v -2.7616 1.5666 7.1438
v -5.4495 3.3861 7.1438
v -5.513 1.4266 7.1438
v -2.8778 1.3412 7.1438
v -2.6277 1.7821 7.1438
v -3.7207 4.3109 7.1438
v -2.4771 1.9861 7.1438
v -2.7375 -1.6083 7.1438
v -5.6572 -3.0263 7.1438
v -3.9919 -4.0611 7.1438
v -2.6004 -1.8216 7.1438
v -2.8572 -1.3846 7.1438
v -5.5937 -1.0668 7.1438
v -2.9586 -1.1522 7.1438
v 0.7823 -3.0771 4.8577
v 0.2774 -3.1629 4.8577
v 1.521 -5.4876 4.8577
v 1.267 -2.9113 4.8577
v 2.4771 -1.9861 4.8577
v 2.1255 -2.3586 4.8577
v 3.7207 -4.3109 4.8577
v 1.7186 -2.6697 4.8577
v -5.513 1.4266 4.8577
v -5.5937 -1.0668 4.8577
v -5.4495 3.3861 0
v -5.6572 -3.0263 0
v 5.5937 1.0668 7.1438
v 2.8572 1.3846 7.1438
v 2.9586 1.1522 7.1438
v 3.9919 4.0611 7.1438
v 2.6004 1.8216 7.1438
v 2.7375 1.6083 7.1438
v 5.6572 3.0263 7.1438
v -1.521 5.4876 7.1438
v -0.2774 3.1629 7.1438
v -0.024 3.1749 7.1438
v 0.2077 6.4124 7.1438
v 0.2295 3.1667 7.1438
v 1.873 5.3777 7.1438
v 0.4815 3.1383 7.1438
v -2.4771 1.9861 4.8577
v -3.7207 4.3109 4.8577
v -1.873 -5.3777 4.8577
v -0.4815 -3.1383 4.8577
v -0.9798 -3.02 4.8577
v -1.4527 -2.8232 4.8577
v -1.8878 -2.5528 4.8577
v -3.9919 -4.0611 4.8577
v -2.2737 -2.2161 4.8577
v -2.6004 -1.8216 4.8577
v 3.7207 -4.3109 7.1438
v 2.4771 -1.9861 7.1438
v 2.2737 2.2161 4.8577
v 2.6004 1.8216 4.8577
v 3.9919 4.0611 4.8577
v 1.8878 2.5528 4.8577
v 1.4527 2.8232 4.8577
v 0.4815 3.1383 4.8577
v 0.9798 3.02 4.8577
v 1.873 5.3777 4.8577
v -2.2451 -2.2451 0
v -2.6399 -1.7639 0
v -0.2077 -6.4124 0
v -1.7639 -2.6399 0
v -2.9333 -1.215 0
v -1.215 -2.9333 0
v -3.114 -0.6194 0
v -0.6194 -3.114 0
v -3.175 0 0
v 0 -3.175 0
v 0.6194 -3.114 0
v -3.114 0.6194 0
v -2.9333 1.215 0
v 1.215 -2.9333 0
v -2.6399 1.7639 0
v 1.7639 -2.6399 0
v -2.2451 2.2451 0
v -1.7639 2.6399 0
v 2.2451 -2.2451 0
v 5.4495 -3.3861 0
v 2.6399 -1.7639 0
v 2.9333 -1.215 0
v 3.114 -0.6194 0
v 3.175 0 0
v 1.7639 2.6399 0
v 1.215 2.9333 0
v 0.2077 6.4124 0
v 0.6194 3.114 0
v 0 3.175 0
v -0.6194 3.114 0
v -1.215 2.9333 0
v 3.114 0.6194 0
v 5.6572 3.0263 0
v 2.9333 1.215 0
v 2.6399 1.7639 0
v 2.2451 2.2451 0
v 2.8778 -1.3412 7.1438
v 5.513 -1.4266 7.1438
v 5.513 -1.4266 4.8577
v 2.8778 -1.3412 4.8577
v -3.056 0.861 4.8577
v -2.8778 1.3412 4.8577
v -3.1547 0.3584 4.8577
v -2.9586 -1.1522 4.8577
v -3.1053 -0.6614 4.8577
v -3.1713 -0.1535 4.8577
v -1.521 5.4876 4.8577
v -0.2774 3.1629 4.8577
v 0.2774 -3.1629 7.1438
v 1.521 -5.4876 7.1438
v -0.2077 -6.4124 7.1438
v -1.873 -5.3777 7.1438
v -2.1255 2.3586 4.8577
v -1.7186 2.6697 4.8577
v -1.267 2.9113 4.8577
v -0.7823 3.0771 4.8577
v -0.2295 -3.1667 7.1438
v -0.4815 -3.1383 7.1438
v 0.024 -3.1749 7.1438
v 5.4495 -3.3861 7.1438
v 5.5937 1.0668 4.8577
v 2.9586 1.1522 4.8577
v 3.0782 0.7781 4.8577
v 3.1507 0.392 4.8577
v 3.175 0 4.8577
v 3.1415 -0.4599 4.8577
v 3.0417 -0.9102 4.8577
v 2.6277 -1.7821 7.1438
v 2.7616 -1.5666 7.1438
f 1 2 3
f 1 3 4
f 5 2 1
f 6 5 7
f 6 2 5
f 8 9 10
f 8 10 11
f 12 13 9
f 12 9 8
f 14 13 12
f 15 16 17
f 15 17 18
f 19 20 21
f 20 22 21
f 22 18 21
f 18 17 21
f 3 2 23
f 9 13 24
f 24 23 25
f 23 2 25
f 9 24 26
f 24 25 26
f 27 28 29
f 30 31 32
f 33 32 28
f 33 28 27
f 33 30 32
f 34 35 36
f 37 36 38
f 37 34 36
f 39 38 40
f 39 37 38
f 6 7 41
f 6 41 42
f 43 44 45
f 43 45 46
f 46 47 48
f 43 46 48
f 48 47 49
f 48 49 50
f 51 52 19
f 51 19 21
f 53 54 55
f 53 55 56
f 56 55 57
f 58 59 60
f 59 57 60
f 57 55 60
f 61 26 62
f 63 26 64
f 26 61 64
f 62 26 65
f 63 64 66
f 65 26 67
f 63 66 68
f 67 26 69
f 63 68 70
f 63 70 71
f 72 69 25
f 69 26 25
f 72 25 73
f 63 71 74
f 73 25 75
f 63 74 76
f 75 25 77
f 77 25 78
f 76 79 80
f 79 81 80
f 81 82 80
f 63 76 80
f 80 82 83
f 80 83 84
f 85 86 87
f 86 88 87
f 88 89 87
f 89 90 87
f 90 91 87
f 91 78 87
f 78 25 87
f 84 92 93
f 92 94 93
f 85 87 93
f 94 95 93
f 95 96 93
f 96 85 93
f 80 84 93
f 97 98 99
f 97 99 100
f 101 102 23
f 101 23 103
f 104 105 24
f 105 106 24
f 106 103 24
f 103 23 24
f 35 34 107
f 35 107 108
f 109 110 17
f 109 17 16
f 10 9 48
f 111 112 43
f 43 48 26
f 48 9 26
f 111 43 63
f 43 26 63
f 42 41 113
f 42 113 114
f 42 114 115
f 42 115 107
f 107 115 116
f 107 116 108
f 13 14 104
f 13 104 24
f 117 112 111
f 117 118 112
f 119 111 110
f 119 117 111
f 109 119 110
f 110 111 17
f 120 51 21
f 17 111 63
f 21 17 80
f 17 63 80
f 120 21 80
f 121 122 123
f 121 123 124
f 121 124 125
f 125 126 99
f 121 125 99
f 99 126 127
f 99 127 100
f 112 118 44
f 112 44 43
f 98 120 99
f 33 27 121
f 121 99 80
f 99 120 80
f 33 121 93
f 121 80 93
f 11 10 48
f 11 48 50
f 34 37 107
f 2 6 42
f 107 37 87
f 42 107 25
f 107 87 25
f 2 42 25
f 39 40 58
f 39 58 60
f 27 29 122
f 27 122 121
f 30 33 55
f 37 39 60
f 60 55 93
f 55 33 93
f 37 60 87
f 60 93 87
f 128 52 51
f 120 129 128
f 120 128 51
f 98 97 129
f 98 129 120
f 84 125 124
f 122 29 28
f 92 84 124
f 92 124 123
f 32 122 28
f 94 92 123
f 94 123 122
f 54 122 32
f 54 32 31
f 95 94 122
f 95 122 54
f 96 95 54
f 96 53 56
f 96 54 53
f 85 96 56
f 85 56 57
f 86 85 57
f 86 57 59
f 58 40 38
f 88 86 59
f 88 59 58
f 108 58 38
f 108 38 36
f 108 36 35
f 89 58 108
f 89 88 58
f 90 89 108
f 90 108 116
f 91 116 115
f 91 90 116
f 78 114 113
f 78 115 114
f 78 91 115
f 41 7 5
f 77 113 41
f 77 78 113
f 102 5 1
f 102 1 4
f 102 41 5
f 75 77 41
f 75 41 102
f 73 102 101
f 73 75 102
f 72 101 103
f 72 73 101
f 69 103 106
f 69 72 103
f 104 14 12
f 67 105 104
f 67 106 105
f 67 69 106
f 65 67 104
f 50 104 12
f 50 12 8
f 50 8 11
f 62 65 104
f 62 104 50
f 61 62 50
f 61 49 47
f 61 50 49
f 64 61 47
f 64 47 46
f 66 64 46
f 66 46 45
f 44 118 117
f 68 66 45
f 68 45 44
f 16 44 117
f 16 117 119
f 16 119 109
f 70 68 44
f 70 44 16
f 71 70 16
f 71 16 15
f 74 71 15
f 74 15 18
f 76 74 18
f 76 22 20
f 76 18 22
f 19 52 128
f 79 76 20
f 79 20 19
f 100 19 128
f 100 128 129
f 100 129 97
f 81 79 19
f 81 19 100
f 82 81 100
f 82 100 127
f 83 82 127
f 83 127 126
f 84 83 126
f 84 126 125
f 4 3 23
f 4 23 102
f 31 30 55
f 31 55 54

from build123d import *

# Parameters (mm, degrees)
SKETCH1_R         = 3.175
EXTRUDE1_DEPTH    = 7.14375
EXTRUDE2_DEPTH    = 2.286
CIRPATTERN1_COUNT = 3


with BuildPart() as part:
    # Sketch1 → Extrude1 (new body)
    with BuildSketch(Plane.XY):
        Polygon((5.657191877, 3.026339728), (0.207708854, 6.412441744), (-5.449483023, 3.386102016), (-5.657191877, -3.026339728), (-0.207708854, -6.412441744), (5.449483023, -3.386102016), align=None)
        Circle(SKETCH1_R, mode=Mode.SUBTRACT)
    extrude(amount=EXTRUDE1_DEPTH)

    # Sketch2 → Extrude2 (cut)
    with BuildSketch(Plane.XY.offset(7.14375)):
        Polygon((-4.410852186, -4.735268522), (2.291891507, 6.051910302), (4.410852186, 4.735268522), (-2.291891507, -6.051910302), align=None)
    extrude2 = extrude(amount=-EXTRUDE2_DEPTH, mode=Mode.SUBTRACT)

    # CirPattern1: Extrude2 ×3 about axis
    cirpattern1_axis = Axis((0, 0, 0), (0, 0, 1))
    for i in range(1, CIRPATTERN1_COUNT):
        add(extrude2.rotate(cirpattern1_axis, i * 360 / CIRPATTERN1_COUNT), mode=Mode.SUBTRACT)


solid = part.part
